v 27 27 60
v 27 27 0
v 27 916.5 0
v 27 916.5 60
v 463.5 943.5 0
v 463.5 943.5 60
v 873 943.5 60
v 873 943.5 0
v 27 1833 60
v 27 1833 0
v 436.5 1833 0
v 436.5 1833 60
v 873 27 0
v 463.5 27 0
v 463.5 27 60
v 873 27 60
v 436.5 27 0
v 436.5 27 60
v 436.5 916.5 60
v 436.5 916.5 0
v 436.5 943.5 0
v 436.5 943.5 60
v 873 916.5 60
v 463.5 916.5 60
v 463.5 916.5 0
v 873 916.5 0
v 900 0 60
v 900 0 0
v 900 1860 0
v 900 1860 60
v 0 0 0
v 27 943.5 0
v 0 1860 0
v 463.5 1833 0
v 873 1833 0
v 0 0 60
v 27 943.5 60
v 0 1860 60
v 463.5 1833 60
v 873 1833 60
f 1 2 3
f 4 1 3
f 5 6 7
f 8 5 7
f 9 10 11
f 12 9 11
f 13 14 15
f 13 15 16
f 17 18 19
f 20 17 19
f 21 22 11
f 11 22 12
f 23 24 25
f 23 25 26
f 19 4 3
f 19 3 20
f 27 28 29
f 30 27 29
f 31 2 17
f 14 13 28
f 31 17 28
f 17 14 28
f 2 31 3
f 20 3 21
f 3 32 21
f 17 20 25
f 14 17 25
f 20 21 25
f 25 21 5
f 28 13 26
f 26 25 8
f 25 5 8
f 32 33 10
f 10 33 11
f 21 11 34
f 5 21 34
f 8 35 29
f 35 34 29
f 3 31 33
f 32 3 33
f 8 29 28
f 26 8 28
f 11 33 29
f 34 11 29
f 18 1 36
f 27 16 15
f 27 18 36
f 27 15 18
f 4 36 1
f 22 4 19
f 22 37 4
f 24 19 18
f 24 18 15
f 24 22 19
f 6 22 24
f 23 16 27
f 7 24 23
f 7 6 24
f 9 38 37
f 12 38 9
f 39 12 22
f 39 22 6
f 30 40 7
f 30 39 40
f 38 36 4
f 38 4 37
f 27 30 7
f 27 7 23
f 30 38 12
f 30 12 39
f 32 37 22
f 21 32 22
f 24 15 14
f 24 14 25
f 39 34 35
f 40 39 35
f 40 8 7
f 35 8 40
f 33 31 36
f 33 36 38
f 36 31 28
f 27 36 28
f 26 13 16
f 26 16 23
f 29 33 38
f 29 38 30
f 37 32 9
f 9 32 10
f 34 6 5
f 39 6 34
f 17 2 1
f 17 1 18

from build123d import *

# Parameters (mm, degrees)
ESQUISSE1_W        = 900
ESQUISSE1_H        = 1860
ESQUISSE1_W_2      = 846
ESQUISSE1_H_2      = 1806
EXTRU_MINCE1_DEPTH = 60
ESQUISSE2_W        = 27
ESQUISSE2_H        = 1806
EXTRU_MINCE2_DEPTH = 60
ESQUISSE3_W        = 846
ESQUISSE3_H        = 27
EXTRU_MINCE3_DEPTH = 60


with BuildPart() as part:
    # Esquisse1 → Extru.-Mince1 (new body)
    with BuildSketch(Plane.XY):
        with Locations((450, 930)):
            Rectangle(ESQUISSE1_W, ESQUISSE1_H)
        with Locations((450, 930)):
            Rectangle(ESQUISSE1_W_2, ESQUISSE1_H_2, mode=Mode.SUBTRACT)
    extrude(amount=EXTRU_MINCE1_DEPTH)

    # Esquisse2 → Extru.-Mince2 (add)
    with BuildSketch(Plane.XY.offset(60)):
        with Locations((450, 930)):
            Rectangle(ESQUISSE2_W, ESQUISSE2_H)
    extrude(amount=-EXTRU_MINCE2_DEPTH)

    # Esquisse3 → Extru.-Mince3 (add)
    with BuildSketch(Plane.XY.offset(60)):
        with Locations((450, 930)):
            Rectangle(ESQUISSE3_W, ESQUISSE3_H)
    extrude(amount=-EXTRU_MINCE3_DEPTH)


solid = part.part
